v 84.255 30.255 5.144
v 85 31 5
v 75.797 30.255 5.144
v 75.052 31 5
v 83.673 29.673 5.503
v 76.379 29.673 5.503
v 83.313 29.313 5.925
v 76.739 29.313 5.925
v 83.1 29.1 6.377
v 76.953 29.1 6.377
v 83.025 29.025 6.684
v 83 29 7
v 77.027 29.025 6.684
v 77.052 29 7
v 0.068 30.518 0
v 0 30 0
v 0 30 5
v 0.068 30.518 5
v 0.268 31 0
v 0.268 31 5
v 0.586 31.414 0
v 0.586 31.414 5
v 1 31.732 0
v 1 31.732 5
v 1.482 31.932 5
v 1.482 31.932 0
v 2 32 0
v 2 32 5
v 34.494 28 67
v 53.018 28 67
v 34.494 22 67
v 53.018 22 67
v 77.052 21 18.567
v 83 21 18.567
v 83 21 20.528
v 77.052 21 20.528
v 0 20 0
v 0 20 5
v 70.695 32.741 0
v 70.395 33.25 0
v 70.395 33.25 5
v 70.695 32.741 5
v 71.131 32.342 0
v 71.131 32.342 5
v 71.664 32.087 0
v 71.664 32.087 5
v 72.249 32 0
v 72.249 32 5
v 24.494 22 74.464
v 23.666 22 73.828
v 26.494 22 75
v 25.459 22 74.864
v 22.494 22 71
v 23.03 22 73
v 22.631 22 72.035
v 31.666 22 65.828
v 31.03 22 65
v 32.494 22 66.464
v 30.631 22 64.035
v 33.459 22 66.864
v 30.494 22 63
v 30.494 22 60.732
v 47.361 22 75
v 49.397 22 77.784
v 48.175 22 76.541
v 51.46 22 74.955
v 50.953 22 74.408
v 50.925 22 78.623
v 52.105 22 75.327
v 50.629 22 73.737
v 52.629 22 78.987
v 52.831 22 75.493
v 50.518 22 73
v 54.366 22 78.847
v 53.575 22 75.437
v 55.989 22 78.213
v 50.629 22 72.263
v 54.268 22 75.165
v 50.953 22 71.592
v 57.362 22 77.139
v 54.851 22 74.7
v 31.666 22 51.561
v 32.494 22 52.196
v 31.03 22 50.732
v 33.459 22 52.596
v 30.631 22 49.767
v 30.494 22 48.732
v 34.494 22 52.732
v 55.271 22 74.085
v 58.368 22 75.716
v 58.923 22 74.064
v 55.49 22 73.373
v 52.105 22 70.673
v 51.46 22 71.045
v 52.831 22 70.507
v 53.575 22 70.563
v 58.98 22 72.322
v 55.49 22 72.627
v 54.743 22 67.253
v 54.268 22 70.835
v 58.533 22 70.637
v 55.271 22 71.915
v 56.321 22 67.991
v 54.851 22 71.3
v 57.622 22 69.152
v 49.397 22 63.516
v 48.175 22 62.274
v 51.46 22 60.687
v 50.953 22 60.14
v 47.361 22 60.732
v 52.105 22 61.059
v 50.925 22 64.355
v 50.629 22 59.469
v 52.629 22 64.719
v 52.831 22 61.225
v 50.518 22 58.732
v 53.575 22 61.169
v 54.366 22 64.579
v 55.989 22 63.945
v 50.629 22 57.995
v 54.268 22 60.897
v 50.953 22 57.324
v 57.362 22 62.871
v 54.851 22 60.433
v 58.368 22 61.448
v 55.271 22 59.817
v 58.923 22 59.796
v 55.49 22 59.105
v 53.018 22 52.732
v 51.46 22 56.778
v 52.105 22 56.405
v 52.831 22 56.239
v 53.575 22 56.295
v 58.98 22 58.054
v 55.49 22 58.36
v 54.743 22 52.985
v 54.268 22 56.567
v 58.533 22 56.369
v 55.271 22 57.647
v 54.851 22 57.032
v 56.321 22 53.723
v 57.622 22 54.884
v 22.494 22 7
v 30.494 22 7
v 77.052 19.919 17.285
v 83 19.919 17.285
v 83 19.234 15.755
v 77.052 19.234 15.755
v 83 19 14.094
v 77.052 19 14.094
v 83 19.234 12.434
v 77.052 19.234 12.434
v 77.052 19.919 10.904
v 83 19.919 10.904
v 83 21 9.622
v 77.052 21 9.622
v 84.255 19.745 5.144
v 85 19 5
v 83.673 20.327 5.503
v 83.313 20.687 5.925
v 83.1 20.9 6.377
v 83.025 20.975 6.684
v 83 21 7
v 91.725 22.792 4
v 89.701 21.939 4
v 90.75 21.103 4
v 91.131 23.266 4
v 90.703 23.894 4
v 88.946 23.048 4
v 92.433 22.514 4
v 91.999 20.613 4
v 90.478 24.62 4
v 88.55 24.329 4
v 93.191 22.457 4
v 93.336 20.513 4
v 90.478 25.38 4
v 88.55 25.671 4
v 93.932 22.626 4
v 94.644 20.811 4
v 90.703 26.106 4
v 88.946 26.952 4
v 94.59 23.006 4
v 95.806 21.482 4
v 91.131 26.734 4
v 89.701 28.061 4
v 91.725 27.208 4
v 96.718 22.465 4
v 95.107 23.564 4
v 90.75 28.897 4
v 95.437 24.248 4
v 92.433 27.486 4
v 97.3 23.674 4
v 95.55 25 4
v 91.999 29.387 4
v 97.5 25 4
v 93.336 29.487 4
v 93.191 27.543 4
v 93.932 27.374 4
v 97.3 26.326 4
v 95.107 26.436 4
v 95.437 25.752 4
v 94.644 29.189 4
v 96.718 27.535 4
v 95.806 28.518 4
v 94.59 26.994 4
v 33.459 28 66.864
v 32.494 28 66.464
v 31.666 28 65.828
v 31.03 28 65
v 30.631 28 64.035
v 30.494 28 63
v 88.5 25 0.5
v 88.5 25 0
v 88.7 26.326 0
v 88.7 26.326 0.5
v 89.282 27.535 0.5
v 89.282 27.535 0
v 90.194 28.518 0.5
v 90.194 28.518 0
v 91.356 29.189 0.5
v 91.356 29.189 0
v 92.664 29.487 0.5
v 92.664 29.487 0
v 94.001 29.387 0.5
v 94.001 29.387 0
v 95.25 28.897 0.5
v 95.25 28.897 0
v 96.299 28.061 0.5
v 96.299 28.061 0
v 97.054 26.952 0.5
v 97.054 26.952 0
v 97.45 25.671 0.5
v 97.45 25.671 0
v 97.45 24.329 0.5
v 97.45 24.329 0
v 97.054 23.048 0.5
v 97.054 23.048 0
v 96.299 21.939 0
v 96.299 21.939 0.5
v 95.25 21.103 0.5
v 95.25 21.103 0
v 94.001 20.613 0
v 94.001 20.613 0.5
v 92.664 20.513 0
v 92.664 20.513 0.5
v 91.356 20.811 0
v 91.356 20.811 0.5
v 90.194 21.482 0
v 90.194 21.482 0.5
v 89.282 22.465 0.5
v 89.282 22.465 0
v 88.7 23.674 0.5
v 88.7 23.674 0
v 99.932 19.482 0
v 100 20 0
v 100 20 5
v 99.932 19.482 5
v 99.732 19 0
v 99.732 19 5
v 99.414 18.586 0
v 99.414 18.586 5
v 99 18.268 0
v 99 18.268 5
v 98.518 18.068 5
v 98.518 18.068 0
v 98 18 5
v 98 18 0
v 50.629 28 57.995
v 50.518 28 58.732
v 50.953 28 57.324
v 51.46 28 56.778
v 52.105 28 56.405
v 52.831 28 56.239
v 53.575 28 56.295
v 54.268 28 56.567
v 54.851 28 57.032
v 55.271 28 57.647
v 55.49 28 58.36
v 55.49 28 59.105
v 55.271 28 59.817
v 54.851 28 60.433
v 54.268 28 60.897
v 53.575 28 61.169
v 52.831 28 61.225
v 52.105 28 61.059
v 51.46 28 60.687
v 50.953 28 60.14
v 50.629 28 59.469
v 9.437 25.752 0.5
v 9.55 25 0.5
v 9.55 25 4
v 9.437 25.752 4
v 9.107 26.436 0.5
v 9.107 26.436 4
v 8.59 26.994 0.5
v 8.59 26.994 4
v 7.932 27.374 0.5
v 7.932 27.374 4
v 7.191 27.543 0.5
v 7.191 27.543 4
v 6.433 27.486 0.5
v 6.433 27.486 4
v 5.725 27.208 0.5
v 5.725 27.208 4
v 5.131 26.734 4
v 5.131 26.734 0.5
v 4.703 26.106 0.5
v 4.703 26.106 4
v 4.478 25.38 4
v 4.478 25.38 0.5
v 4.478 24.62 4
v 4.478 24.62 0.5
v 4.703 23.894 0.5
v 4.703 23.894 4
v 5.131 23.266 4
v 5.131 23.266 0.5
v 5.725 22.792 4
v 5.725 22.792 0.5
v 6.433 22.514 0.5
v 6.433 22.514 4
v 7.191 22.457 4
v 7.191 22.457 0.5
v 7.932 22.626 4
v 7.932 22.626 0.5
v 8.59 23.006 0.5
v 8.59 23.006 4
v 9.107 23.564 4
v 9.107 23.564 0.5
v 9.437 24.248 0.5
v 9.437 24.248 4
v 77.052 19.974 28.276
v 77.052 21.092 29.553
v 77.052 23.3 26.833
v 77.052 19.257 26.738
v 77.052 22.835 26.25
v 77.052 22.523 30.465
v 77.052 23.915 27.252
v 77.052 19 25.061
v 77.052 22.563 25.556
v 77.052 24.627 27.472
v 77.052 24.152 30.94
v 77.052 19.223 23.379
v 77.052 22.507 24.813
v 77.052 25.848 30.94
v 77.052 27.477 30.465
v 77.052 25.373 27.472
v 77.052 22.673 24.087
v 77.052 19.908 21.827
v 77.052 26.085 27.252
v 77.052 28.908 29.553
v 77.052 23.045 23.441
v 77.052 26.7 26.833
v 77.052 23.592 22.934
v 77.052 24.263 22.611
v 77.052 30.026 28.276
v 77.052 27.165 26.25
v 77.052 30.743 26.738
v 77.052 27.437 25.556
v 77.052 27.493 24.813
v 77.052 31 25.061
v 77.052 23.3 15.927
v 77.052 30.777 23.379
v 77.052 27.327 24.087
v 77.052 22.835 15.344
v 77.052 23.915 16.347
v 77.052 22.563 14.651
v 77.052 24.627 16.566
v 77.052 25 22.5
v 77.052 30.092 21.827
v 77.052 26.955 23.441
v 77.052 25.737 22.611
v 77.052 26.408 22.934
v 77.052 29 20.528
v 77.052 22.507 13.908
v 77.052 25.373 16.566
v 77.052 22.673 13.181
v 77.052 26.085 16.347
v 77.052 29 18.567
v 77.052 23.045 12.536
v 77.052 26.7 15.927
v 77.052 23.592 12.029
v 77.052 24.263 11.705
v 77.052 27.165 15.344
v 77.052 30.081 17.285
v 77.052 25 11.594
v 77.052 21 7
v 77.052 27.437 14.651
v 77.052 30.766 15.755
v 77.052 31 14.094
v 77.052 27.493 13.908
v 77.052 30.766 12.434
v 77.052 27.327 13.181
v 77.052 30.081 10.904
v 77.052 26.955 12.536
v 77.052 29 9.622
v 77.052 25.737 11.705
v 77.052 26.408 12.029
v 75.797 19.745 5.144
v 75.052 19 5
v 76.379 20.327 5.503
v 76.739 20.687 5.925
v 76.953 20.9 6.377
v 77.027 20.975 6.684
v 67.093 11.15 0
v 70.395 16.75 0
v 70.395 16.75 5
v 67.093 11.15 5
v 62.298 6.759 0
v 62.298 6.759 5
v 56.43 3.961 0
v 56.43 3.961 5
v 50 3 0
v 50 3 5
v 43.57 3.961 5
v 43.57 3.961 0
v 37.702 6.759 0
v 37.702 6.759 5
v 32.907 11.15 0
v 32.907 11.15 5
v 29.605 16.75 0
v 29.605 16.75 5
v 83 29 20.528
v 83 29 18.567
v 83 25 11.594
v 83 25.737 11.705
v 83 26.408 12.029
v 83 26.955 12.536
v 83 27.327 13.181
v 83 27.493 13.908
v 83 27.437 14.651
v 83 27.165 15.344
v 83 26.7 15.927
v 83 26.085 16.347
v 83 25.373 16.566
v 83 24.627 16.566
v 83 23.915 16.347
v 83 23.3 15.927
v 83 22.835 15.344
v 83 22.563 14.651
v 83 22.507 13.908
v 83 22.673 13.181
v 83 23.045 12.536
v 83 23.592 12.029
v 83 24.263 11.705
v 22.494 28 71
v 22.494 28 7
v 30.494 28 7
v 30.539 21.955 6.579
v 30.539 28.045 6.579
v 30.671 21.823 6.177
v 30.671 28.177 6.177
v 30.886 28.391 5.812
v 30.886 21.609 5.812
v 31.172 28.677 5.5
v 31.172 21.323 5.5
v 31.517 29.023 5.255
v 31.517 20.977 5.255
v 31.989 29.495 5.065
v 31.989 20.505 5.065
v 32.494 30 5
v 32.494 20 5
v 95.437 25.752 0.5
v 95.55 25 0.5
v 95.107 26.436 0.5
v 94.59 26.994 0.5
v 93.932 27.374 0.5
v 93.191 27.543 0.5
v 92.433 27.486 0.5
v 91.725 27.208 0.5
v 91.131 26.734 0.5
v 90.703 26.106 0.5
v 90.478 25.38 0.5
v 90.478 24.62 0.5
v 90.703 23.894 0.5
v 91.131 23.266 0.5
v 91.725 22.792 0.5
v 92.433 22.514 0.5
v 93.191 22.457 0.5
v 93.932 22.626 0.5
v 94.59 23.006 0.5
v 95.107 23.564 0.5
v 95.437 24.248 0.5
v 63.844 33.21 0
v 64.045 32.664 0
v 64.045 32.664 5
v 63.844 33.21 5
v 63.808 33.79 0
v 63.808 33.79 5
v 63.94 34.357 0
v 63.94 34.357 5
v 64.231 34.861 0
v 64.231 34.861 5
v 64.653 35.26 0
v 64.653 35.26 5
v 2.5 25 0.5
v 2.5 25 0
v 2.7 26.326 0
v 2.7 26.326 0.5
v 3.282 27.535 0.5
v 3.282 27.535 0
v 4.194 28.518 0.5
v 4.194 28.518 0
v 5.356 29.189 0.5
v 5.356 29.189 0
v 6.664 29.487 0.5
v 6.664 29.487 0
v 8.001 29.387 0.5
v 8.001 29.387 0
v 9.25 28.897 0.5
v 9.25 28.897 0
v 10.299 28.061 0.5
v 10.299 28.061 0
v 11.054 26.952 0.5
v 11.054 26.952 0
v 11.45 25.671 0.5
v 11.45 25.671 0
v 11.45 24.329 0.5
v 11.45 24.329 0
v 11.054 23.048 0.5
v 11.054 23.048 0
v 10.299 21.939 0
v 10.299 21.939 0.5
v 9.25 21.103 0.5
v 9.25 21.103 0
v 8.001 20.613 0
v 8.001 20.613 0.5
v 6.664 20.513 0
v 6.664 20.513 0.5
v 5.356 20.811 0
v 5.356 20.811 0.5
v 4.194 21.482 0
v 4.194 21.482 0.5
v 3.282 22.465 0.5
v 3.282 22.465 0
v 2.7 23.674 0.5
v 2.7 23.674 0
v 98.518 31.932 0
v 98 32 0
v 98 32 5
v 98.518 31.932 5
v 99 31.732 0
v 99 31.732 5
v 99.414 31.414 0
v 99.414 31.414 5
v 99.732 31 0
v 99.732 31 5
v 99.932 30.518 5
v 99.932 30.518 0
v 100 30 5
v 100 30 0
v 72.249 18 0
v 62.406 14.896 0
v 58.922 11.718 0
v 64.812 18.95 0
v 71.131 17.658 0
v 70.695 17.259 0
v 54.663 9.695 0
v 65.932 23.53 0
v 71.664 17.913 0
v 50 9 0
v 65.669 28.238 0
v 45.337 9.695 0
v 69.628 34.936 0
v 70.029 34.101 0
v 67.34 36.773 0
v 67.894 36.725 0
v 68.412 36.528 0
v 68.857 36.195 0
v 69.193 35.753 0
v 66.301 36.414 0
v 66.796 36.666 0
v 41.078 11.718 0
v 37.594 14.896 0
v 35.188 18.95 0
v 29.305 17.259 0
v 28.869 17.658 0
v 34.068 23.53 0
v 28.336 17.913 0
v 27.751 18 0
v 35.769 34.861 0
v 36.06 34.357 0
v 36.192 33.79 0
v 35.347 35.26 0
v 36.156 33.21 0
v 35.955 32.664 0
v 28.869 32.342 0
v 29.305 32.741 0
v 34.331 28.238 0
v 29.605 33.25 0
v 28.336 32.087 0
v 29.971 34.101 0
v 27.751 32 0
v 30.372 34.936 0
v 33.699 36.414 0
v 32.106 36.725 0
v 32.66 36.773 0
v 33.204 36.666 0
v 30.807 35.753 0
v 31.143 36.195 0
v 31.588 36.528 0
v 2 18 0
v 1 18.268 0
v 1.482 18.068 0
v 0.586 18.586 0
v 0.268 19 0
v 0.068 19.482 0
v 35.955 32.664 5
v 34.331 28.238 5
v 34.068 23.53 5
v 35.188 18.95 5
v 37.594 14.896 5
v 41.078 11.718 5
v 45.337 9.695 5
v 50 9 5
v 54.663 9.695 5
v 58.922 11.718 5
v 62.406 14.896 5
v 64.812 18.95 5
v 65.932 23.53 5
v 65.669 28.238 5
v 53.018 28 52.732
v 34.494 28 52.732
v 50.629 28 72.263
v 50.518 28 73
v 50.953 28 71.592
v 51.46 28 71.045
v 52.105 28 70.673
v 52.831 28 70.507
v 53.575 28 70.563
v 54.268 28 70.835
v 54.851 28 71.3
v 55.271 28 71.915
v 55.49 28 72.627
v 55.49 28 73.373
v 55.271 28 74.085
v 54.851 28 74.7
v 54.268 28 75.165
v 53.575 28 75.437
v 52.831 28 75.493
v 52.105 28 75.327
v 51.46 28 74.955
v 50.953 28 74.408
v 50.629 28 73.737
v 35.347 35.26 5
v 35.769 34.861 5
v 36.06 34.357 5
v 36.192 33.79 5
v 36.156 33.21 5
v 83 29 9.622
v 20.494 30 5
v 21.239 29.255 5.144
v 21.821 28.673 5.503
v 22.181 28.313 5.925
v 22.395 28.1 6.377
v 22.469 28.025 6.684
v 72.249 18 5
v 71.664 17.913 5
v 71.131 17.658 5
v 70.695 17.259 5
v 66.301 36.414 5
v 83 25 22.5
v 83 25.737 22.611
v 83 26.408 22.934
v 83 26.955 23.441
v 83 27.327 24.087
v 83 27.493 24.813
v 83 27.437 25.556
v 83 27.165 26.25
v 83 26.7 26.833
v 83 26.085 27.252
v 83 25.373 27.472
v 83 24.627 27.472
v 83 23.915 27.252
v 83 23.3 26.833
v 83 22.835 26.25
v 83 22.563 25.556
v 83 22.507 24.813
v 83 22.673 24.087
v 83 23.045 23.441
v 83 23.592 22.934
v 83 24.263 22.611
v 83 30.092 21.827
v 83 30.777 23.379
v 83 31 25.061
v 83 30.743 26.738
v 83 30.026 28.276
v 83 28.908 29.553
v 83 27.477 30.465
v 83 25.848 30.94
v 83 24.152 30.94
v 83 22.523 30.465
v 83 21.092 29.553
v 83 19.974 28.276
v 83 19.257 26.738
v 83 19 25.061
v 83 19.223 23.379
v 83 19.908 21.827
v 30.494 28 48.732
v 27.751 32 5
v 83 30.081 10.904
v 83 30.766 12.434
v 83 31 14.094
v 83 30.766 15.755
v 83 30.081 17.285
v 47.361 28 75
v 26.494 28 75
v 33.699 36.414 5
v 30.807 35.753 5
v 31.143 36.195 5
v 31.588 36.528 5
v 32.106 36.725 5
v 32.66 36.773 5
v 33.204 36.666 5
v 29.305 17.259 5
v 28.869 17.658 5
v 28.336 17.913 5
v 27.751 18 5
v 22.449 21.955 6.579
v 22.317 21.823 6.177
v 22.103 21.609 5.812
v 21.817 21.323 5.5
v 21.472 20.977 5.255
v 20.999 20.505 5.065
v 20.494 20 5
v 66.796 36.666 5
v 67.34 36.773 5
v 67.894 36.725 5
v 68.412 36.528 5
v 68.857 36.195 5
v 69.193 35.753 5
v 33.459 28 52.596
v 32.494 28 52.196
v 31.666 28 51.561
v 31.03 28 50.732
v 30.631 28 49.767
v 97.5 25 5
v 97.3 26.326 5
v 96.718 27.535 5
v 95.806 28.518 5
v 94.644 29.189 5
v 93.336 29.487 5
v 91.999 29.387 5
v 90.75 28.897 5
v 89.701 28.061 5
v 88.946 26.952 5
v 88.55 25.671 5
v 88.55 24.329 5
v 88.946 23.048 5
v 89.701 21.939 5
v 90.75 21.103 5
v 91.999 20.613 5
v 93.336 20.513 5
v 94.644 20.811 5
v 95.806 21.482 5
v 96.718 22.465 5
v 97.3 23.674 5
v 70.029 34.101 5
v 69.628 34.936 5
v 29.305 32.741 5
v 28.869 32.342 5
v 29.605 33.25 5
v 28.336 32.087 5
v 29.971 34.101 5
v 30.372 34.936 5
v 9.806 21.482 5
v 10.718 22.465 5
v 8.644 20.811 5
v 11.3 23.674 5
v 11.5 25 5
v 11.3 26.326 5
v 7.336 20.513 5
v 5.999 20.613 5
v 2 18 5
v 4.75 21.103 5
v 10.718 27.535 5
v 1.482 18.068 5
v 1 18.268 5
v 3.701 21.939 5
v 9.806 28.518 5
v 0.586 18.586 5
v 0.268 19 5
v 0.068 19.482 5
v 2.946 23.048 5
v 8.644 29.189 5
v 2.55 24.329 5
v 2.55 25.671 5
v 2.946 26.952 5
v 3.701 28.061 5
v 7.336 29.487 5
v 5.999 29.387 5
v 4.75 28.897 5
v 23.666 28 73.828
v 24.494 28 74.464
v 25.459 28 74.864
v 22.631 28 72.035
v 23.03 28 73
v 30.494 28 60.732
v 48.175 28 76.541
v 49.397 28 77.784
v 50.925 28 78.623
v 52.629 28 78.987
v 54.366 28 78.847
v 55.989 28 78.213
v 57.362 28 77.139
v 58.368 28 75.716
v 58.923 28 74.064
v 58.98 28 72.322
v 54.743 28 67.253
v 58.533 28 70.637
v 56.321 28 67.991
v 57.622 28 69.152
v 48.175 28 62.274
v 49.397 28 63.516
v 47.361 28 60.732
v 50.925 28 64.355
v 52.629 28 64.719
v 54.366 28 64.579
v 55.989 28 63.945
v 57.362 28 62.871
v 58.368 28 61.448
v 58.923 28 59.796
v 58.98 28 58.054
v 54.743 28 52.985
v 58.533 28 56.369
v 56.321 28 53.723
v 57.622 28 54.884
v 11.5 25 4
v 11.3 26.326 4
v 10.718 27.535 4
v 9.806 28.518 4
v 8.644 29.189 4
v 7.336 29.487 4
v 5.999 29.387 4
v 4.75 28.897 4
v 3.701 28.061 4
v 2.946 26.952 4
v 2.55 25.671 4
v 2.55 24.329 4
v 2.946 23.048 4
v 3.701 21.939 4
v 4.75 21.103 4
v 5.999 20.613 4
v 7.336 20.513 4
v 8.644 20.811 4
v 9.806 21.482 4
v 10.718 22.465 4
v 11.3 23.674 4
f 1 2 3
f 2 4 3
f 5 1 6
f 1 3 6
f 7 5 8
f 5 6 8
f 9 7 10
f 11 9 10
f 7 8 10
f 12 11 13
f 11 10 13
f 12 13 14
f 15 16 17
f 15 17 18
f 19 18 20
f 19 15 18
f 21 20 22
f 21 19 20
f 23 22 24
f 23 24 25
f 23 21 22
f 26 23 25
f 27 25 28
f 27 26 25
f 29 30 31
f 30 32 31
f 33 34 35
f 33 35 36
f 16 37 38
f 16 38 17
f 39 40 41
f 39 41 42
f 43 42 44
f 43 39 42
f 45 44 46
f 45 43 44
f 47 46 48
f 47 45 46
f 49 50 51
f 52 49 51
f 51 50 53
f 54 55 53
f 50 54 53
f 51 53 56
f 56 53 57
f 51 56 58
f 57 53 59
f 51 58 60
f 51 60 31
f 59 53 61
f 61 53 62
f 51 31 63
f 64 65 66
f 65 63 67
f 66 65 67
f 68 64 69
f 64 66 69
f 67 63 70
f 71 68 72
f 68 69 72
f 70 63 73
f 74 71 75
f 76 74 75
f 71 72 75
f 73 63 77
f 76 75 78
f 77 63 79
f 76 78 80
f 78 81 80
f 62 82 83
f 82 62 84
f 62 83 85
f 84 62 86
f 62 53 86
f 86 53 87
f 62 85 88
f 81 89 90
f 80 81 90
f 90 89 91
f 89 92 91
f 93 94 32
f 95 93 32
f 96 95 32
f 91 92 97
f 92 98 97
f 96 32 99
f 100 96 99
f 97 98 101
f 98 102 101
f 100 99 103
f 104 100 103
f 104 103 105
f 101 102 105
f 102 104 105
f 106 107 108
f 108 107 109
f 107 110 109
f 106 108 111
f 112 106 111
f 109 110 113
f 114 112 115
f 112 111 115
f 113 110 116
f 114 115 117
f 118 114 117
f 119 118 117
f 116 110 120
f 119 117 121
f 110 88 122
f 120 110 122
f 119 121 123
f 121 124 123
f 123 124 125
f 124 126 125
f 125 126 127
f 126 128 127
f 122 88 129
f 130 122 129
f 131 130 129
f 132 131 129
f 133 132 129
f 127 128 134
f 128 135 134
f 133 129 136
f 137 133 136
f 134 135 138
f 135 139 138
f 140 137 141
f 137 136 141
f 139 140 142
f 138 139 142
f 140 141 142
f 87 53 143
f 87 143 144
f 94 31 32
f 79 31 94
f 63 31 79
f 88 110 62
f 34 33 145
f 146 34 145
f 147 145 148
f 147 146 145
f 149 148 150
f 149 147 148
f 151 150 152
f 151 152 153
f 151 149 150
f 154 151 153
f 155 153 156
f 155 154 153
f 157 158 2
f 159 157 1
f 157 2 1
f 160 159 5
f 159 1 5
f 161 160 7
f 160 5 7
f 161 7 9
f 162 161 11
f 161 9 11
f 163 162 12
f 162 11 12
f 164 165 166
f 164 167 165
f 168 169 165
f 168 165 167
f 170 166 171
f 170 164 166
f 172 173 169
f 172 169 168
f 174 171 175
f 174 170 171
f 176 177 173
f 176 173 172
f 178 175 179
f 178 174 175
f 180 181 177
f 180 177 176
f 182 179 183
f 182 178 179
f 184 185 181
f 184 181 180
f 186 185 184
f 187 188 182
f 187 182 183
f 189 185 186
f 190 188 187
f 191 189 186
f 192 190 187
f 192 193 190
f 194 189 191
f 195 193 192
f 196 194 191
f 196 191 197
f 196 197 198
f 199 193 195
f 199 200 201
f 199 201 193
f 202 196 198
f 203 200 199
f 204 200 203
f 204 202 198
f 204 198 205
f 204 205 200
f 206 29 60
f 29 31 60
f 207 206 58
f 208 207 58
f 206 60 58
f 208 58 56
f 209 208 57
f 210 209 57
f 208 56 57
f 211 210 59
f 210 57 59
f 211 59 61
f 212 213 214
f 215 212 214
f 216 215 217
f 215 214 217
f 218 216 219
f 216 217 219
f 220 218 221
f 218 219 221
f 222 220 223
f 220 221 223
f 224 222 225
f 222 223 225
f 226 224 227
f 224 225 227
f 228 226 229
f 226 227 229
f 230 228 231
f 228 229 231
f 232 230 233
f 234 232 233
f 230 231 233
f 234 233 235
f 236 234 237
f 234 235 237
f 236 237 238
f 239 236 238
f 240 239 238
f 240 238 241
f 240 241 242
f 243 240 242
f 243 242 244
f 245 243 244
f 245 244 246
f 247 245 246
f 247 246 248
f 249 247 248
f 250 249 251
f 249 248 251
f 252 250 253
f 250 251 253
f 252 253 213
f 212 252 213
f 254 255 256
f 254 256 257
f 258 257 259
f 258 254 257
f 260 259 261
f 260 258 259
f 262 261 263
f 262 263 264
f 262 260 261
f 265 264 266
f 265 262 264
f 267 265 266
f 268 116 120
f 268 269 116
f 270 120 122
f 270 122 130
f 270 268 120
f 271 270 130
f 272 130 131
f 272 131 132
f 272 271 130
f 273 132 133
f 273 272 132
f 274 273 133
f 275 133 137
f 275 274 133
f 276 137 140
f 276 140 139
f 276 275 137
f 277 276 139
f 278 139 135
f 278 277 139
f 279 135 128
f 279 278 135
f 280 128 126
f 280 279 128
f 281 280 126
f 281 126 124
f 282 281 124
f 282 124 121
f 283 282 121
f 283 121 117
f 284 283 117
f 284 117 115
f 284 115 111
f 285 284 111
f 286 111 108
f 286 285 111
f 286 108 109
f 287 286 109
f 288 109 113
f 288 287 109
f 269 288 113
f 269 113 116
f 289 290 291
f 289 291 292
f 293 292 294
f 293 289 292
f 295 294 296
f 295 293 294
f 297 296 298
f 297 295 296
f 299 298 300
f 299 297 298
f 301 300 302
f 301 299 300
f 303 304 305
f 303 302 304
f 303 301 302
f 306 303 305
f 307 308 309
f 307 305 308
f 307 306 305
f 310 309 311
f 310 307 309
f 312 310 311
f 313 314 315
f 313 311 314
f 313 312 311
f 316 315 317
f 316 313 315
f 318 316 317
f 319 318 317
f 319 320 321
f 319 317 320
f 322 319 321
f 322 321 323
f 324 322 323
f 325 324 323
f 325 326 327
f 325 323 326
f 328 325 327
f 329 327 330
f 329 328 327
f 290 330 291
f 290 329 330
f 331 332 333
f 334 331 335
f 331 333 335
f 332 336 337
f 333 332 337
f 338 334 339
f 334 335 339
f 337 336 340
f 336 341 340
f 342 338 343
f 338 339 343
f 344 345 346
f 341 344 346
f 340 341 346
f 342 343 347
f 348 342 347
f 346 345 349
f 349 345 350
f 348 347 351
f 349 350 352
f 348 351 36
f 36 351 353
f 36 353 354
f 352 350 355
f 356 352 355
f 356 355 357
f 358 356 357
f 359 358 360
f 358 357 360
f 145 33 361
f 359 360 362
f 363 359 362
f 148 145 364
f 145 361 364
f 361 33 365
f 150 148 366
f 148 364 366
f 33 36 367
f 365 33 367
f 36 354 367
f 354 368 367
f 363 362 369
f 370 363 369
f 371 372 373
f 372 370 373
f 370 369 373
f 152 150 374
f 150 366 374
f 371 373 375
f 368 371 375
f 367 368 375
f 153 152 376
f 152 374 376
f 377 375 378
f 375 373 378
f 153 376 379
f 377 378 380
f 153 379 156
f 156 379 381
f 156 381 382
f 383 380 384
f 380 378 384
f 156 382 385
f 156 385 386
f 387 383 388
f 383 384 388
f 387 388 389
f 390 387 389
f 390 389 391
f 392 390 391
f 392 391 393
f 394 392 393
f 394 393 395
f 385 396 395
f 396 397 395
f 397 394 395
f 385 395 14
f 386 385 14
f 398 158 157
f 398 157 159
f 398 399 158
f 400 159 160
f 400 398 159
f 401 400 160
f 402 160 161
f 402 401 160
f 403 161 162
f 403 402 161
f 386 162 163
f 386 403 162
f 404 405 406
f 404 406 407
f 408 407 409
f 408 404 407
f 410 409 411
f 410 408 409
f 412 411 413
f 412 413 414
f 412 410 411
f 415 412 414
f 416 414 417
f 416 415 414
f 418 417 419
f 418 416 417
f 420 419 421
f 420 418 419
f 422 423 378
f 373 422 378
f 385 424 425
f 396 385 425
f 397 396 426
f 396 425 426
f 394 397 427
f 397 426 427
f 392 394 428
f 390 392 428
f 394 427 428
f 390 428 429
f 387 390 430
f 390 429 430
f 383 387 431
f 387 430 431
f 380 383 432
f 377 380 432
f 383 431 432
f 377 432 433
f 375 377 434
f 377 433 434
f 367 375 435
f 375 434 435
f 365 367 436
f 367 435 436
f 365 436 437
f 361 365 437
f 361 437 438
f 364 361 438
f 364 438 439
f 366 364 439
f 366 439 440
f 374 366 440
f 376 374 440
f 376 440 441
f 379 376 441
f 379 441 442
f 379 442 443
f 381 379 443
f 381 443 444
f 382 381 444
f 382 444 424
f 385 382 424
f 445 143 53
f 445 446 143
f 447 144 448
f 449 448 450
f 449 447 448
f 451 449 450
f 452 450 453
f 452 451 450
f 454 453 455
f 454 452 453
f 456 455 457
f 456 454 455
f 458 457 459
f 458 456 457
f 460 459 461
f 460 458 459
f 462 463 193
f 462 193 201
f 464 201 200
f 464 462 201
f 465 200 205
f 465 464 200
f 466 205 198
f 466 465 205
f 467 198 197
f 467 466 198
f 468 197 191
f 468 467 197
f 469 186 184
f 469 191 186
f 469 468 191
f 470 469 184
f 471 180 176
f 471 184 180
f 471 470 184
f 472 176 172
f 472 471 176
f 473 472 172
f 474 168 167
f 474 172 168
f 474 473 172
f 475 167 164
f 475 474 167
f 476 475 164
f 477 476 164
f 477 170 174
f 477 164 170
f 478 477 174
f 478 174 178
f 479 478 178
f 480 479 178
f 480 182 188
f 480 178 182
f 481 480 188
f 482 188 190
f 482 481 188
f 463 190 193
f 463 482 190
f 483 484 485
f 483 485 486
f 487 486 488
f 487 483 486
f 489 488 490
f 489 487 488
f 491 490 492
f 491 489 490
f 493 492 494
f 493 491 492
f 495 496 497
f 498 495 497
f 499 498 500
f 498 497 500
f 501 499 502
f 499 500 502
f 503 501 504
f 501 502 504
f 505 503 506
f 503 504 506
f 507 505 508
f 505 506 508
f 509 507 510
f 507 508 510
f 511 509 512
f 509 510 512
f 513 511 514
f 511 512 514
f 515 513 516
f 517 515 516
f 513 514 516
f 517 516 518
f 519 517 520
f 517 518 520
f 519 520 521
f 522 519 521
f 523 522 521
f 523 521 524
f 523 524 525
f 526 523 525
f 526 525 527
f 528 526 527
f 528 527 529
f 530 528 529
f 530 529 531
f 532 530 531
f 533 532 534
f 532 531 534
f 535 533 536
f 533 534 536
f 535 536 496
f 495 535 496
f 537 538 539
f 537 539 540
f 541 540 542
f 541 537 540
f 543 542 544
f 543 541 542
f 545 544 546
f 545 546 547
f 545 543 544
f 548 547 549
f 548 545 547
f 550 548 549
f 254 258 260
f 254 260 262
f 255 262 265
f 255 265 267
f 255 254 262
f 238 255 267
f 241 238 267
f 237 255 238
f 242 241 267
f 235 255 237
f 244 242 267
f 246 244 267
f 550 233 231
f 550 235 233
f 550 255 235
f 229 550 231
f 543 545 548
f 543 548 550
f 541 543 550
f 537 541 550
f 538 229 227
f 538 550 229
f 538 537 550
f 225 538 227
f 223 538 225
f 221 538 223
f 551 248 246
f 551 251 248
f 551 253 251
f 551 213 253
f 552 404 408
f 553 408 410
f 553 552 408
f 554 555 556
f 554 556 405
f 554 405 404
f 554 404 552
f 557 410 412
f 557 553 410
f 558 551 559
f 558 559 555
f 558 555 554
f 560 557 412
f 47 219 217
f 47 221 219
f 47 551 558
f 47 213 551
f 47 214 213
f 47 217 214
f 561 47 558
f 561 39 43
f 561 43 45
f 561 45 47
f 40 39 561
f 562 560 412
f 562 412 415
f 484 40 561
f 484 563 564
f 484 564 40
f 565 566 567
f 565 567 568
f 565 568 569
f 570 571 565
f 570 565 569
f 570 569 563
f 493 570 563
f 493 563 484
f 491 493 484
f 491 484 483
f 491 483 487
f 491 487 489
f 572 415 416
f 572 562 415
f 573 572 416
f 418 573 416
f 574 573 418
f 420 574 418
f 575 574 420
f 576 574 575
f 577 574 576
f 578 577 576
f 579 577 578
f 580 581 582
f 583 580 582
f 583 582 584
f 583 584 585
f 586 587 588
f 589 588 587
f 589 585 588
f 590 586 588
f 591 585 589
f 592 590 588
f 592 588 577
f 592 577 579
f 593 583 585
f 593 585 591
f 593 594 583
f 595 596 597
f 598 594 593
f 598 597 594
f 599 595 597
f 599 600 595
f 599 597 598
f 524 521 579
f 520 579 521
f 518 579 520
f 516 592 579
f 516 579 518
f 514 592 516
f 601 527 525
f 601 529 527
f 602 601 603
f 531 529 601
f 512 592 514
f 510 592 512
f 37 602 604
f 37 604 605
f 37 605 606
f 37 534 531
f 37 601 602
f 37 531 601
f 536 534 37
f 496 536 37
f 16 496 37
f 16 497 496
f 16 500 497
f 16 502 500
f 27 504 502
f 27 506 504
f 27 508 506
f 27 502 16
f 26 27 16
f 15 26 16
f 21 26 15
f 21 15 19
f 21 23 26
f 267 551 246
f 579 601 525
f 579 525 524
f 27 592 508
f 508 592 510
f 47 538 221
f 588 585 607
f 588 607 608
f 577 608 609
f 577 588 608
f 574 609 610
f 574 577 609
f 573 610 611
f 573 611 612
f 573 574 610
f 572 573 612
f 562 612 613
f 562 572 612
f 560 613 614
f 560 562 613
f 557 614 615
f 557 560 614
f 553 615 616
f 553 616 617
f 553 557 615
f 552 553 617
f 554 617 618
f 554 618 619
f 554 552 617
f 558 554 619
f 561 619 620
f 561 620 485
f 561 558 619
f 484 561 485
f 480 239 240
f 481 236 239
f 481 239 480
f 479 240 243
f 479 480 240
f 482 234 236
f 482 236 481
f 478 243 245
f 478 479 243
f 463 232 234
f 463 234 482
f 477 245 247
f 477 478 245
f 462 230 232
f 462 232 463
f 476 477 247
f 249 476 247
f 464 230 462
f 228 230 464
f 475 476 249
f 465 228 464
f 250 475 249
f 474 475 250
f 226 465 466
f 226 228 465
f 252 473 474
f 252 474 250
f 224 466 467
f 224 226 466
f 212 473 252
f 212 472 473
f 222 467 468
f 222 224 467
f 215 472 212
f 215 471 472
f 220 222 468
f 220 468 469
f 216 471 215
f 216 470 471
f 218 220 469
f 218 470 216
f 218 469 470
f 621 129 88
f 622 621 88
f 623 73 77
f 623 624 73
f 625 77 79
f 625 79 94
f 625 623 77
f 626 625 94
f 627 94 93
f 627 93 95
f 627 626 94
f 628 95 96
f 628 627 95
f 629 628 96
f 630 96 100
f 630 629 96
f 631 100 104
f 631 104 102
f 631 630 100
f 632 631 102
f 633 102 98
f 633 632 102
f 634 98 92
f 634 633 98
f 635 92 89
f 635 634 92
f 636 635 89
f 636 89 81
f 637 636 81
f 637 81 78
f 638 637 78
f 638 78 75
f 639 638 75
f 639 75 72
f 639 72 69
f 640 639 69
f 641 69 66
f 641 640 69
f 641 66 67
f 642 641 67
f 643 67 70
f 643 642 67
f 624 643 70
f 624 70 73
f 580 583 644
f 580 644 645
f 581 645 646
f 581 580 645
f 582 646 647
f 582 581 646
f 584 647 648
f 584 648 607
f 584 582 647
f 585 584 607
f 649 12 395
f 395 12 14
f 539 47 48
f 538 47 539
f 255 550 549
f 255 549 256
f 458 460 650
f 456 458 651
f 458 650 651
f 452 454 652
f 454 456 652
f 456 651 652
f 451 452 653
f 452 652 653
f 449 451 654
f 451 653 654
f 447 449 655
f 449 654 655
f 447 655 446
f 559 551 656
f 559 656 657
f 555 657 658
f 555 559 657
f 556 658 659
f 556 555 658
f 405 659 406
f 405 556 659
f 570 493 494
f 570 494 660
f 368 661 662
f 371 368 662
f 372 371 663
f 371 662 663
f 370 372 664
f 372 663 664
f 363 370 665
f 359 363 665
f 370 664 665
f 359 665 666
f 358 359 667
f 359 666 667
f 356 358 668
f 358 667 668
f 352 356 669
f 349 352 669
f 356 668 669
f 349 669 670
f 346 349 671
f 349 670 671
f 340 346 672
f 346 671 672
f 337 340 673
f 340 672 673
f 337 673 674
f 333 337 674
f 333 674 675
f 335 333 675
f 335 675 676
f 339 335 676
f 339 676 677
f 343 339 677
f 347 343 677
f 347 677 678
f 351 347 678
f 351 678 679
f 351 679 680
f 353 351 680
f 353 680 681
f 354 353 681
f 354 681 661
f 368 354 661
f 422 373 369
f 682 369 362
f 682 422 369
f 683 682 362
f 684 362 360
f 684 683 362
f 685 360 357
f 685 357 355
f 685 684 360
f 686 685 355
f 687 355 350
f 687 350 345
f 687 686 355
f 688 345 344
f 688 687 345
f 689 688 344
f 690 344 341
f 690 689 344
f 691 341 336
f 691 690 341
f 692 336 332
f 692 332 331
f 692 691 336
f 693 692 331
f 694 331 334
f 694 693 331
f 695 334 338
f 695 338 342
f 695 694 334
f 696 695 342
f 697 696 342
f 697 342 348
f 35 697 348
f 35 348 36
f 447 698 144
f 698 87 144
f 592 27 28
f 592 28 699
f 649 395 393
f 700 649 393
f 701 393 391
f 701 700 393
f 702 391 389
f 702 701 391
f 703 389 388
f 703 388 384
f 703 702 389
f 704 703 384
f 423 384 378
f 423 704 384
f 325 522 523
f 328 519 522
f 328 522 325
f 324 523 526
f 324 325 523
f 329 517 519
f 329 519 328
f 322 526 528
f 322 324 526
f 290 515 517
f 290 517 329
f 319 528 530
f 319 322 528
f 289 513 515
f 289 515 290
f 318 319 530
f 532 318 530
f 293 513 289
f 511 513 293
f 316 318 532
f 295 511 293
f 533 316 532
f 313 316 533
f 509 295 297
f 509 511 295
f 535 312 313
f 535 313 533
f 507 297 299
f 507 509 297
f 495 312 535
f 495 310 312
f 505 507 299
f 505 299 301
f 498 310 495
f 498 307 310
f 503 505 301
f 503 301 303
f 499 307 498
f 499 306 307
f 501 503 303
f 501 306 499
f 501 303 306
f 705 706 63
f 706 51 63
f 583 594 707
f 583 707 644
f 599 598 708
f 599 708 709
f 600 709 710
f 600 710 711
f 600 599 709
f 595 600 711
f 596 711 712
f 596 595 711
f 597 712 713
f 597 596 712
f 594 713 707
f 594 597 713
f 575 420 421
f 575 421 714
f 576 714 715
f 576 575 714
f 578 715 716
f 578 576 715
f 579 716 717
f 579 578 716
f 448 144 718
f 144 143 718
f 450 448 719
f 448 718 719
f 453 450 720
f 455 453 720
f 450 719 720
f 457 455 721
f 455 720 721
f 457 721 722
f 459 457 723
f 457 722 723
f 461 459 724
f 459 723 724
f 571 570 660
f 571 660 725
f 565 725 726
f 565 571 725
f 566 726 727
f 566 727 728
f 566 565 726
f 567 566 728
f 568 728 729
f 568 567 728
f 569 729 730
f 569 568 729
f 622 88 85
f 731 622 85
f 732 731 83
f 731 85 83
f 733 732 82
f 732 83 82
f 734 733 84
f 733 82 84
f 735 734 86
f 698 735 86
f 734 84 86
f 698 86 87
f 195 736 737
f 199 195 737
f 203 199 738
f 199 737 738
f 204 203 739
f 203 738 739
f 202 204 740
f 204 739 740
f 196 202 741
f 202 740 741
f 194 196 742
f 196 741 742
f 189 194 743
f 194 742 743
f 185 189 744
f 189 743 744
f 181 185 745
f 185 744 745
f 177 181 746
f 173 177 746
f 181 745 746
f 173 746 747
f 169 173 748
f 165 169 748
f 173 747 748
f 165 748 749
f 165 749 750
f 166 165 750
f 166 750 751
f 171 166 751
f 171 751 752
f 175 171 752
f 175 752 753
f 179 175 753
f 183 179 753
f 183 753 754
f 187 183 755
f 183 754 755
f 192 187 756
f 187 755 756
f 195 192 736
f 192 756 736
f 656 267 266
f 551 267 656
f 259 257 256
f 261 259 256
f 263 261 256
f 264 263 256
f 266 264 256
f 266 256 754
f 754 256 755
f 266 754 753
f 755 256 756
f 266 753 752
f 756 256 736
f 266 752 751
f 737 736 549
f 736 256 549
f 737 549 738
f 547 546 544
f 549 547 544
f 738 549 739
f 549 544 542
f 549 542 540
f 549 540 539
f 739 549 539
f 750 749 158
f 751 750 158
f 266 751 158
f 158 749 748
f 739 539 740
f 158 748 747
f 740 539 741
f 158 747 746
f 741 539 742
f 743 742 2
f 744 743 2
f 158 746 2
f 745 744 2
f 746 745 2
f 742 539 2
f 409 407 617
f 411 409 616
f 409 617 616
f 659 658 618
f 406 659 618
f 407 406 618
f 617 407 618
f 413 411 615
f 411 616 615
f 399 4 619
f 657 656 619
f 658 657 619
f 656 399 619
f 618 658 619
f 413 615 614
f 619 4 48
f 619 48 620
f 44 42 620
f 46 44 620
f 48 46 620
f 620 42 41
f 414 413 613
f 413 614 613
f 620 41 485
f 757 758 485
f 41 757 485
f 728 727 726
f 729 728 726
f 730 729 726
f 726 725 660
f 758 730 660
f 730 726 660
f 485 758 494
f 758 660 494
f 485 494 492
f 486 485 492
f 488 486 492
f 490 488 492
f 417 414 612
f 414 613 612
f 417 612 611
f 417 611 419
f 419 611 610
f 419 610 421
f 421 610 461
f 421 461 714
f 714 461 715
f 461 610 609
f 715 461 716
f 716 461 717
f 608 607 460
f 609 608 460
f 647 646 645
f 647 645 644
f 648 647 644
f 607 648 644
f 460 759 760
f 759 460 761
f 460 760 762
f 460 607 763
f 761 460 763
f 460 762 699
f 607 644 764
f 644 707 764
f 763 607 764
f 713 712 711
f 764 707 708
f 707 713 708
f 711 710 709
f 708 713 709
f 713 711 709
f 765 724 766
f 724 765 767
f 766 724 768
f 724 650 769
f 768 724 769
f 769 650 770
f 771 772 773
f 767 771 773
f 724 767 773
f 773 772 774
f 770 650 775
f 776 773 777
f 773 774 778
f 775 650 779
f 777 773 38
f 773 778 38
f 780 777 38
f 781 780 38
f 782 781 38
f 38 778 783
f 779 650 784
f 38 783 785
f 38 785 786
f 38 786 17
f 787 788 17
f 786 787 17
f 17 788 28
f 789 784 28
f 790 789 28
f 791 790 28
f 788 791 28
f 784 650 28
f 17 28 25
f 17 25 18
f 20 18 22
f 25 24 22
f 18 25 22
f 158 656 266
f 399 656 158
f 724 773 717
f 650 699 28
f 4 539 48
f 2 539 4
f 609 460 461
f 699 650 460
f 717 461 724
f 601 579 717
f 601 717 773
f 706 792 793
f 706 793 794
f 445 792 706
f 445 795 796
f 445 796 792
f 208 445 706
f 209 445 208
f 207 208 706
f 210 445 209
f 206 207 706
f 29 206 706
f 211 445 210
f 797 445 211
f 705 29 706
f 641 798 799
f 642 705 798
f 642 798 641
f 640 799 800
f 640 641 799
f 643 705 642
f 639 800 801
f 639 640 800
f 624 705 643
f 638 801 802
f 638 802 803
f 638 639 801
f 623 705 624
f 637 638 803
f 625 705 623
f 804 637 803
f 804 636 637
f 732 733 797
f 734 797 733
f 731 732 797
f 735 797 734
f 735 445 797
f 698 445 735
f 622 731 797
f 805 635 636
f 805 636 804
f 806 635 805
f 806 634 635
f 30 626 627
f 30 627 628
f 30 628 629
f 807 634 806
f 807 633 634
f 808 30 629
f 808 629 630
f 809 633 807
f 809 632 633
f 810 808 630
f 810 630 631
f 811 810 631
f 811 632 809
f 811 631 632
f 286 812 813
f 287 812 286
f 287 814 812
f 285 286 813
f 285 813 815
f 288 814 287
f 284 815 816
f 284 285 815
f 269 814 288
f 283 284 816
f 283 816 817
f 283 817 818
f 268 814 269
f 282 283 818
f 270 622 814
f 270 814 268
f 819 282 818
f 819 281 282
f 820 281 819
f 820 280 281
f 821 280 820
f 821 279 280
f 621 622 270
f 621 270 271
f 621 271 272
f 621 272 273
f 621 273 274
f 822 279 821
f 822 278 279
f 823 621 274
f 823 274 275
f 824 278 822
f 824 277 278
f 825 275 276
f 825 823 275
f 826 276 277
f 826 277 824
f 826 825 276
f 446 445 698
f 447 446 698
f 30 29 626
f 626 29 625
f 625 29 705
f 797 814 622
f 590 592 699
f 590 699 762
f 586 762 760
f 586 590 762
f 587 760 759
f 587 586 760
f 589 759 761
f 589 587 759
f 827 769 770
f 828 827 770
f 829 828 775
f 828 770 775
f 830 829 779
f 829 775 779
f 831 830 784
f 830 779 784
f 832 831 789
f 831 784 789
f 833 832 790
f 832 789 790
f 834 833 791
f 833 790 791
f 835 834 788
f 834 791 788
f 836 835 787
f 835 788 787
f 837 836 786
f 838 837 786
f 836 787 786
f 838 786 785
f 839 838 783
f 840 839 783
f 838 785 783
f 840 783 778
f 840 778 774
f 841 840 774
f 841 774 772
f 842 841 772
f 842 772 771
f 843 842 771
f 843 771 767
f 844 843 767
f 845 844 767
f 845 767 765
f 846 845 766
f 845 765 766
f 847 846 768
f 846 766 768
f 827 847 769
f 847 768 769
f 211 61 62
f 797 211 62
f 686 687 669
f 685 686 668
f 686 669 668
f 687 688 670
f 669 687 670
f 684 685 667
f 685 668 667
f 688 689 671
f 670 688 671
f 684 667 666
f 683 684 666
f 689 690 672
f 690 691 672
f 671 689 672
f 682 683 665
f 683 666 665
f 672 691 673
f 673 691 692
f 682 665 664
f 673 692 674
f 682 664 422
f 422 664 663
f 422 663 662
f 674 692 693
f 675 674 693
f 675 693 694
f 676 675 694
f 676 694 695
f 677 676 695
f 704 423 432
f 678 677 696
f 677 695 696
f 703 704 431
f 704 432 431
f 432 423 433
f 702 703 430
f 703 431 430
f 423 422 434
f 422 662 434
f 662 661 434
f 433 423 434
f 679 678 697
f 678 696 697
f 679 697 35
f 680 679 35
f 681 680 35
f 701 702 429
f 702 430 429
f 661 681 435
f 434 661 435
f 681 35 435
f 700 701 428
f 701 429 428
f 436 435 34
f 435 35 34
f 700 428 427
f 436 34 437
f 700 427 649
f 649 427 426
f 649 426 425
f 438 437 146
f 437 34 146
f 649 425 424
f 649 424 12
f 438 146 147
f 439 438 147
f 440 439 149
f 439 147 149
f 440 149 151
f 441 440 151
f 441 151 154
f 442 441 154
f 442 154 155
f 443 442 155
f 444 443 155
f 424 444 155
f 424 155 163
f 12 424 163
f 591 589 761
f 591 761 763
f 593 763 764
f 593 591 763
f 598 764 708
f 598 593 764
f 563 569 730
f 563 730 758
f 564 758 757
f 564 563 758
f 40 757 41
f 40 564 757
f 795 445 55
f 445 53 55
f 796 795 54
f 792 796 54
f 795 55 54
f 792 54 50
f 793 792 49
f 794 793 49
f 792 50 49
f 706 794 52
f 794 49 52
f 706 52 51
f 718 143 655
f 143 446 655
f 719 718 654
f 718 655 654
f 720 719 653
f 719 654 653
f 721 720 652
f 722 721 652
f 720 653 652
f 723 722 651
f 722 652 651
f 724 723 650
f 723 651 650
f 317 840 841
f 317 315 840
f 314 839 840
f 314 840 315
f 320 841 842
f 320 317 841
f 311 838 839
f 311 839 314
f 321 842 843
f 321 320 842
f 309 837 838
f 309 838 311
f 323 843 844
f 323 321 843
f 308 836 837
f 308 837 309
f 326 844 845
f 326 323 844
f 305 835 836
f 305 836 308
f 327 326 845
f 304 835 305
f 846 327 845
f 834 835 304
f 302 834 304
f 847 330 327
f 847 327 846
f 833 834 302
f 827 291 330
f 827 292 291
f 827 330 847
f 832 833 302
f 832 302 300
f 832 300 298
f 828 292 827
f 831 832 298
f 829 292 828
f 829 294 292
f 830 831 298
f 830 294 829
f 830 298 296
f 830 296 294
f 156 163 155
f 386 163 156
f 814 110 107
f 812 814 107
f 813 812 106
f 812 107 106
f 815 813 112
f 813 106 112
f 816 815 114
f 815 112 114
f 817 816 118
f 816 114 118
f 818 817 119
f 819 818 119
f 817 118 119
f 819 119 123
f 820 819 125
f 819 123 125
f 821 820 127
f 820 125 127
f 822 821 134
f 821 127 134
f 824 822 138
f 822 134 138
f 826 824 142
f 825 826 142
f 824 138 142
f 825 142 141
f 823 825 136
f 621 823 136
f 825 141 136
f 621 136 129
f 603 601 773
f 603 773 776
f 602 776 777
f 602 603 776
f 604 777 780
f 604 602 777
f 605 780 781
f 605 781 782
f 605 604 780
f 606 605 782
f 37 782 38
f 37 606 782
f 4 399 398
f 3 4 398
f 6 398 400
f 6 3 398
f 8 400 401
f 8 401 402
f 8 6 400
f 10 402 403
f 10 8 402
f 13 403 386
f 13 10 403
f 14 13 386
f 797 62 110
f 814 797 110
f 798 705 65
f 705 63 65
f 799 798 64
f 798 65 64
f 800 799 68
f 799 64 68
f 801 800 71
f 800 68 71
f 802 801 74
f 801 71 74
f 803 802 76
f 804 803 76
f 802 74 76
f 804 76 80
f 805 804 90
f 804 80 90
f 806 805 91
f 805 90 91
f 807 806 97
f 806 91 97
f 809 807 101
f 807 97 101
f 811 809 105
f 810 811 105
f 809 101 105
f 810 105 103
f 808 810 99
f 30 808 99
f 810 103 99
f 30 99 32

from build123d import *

# Parameters (mm, degrees)
SKETCH1_R                = 2.55
BOSS_EXTRUDE1_DEPTH      = 5
SKETCH4_R                = 4.5
CUT_EXTRUDE2_DEPTH       = 1
SKETCH6_W                = 5.947651005
SKETCH6_H                = 20
BOSS_EXTRUDE2_DEPTH      = 4
BOSS_EXTRUDE2_DEPTH_BACK = 4
SKETCH11_R               = 4.5
CUT_EXTRUDE3_DEPTH       = 0.5
SKETCH16_R               = 2.5
BOSS_EXTRUDE3_DEPTH      = 3
BOSS_EXTRUDE3_DEPTH_BACK = 3
FILLET3_R                = 2
BOSS_EXTRUDE4_DEPTH      = 5.947651
CUT_EXTRUDE5_REACH       = 85
SKETCH18_R               = 2.5


with BuildPart() as part:
    # Sketch1 → Boss-Extrude1 (new body)
    with BuildSketch(Plane.XY):
        with BuildLine():
            Line((100, 25), (100, 20))
            ThreePointArc((100, 20), (99.414213562, 18.585786438), (98, 18))
            Line((98, 18), (72.248595461, 18))
            ThreePointArc((72.248595461, 18), (71.130561473, 17.658312395), (70.39454584, 16.75))
            ThreePointArc((70.39454584, 16.75), (50, 3), (29.60545416, 16.75))
            ThreePointArc((29.60545416, 16.75), (28.869438527, 17.658312395), (27.751404539, 18))
            Line((27.751404539, 18), (2, 18))
            ThreePointArc((2, 18), (0.585786438, 18.585786438), (0, 20))
            Line((0, 20), (0, 25))
            Line((0, 25), (0, 30))
            ThreePointArc((0, 30), (0.585786438, 31.414213562), (2, 32))
            Line((2, 32), (21.056240945, 32))
            Line((21.056240945, 32), (27.751404539, 32))
            ThreePointArc((27.751404539, 32), (28.869438527, 32.341687605), (29.60545416, 33.25))
            ThreePointArc((29.60545416, 33.25), (30.166752838, 34.520625347), (30.807119991, 35.753295167))
            ThreePointArc((30.807119991, 35.753295167), (32.106461975, 36.725482012), (33.699080137, 36.414026968))
            Line((33.699080137, 36.414026968), (35.34656276, 35.260447216))
            ThreePointArc((35.34656276, 35.260447216), (36.146649881, 34.078494315), (35.955031011, 32.664127224))
            ThreePointArc((35.955031011, 32.664127224), (50, 9), (64.044968989, 32.664127224))
            ThreePointArc((64.044968989, 32.664127224), (63.853350119, 34.078494315), (64.65343724, 35.260447216))
            Line((64.65343724, 35.260447216), (66.300919863, 36.414026968))
            ThreePointArc((66.300919863, 36.414026968), (67.893538025, 36.725482012), (69.192880009, 35.753295167))
            ThreePointArc((69.192880009, 35.753295167), (69.833247162, 34.520625347), (70.39454584, 33.25))
            ThreePointArc((70.39454584, 33.25), (71.130561473, 32.341687605), (72.248595461, 32))
            Line((72.248595461, 32), (78.943759055, 32))
            Line((78.943759055, 32), (98, 32))
            ThreePointArc((98, 32), (99.414213562, 31.414213562), (100, 30))
            Line((100, 30), (100, 25))
        make_face()
        with Locations((93, 25)):
            Circle(SKETCH1_R, mode=Mode.SUBTRACT)
        with Locations((7, 25)):
            Circle(SKETCH1_R, mode=Mode.SUBTRACT)
    extrude(amount=BOSS_EXTRUDE1_DEPTH)

    # Sketch4 → Cut-Extrude2 (cut)
    with BuildSketch(Plane.XY.offset(5)):
        with Locations((93, 25)):
            Circle(SKETCH4_R)
        with Locations((7, 25)):
            Circle(SKETCH4_R)
    extrude(amount=-CUT_EXTRUDE2_DEPTH, mode=Mode.SUBTRACT)

    # Sketch6 → Boss-Extrude2 (add, two sides)
    with BuildSketch(Plane(origin=(0, 25, 0), x_dir=(-1, 0, 0), z_dir=(0, -1, 0))) as boss_extrude2_sk:
        with Locations((-80.026174497, -15)):
            Rectangle(SKETCH6_W, SKETCH6_H)
    extrude(amount=BOSS_EXTRUDE2_DEPTH)
    extrude(boss_extrude2_sk.sketch, amount=-BOSS_EXTRUDE2_DEPTH_BACK)

    # Sketch11 → Cut-Extrude3 (cut)
    with BuildSketch(Plane(origin=(0, 0, 0), x_dir=(-1, 0, 0), z_dir=(0, 0, -1))):
        with Locations((-93, 25)):
            Circle(SKETCH11_R)
        with Locations((-7, 25)):
            Circle(SKETCH11_R)
    extrude(amount=-CUT_EXTRUDE3_DEPTH, mode=Mode.SUBTRACT)

    # Sketch16 → Boss-Extrude3 (add, two sides)
    with BuildSketch(Plane(origin=(0, 25, 0), x_dir=(-1, 0, 0), z_dir=(0, -1, 0))) as boss_extrude3_sk:
        with BuildLine():
            Line((-30.494270905, -5), (-22.494270905, -5))
            Line((-22.494270905, -5), (-22.494270905, -71))
            ThreePointArc((-22.494270905, -71), (-23.665843781, -73.828427125), (-26.494270905, -75))
            Line((-26.494270905, -75), (-30.494270905, -75))
            Line((-30.494270905, -75), (-47.361403242, -75))
            ThreePointArc((-47.361403242, -75), (-57.917236977, -76.464101615), (-53.018257491, -67))
            Line((-53.018257491, -67), (-34.494270905, -67))
            ThreePointArc((-34.494270905, -67), (-31.665843781, -65.828427125), (-30.494270905, -63))
            Line((-30.494270905, -63), (-30.494270905, -60.732138804))
            Line((-30.494270905, -60.732138804), (-47.361403242, -60.732138804))
            ThreePointArc((-47.361403242, -60.732138804), (-57.917236977, -62.196240419), (-53.018257491, -52.732138804))
            Line((-53.018257491, -52.732138804), (-34.494270905, -52.732138804))
            ThreePointArc((-34.494270905, -52.732138804), (-31.665843781, -51.560565928), (-30.494270905, -48.732138804))
            Line((-30.494270905, -48.732138804), (-30.494270905, -5))
        make_face()
        with Locations((-53.018257491, -73)):
            Circle(SKETCH16_R, mode=Mode.SUBTRACT)
        with Locations((-53.018257491, -58.732138804)):
            Circle(SKETCH16_R, mode=Mode.SUBTRACT)
    extrude(amount=BOSS_EXTRUDE3_DEPTH)
    extrude(boss_extrude3_sk.sketch, amount=-BOSS_EXTRUDE3_DEPTH_BACK)

    # Fillet3
    fillet3_edges = [part.edges().sort_by_distance(p)[0] for p in [
        (83, 25, 5),
        (80.026174498, 29, 5),
        (77.052348995, 25, 5),
        (80.026174498, 21, 5),
        (30.494270905, 25, 5),
        (26.494270905, 28, 5),
        (22.494270905, 25, 5),
        (26.494270905, 22, 5),
    ]]
    fillet(fillet3_edges, radius=FILLET3_R)

    # Sketch17 → Boss-Extrude4 (add)
    with BuildSketch(Plane(origin=(83, 0, 0), x_dir=(0, 0, -1), z_dir=(1, 0, 0))):
        with BuildLine():
            ThreePointArc((-19.547210182, 27.503414308), (-31, 25), (-19.547210182, 22.496585692))
            ThreePointArc((-19.547210182, 22.496585692), (-8.094420363, 25), (-19.547210182, 27.503414308))
        make_face()
    extrude(amount=-BOSS_EXTRUDE4_DEPTH)

    # Sketch18 → Cut-Extrude5 (cut, up to next)
    with BuildSketch(Plane(origin=(83, 0, 0), x_dir=(0, 0, -1), z_dir=(1, 0, 0)), mode=Mode.PRIVATE) as cut_extrude5_sk1:
        with Locations((-25, 25)):
            Circle(SKETCH18_R)
    cut_extrude5_tool1 = extrude(cut_extrude5_sk1.sketch, amount=-CUT_EXTRUDE5_REACH, mode=Mode.PRIVATE) & part.part
    add(cut_extrude5_tool1.solids().sort_by_distance((83, 25, 25))[0], mode=Mode.SUBTRACT)
    # Sketch18 → Cut-Extrude5 (cut, up to next)
    with BuildSketch(Plane(origin=(83, 0, 0), x_dir=(0, 0, -1), z_dir=(1, 0, 0)), mode=Mode.PRIVATE) as cut_extrude5_sk2:
        with Locations((-14.094420363, 25)):
            Circle(SKETCH18_R)
    cut_extrude5_tool2 = extrude(cut_extrude5_sk2.sketch, amount=-CUT_EXTRUDE5_REACH, mode=Mode.PRIVATE) & part.part
    add(cut_extrude5_tool2.solids().sort_by_distance((83, 25, 14.09442))[0], mode=Mode.SUBTRACT)


solid = part.part
